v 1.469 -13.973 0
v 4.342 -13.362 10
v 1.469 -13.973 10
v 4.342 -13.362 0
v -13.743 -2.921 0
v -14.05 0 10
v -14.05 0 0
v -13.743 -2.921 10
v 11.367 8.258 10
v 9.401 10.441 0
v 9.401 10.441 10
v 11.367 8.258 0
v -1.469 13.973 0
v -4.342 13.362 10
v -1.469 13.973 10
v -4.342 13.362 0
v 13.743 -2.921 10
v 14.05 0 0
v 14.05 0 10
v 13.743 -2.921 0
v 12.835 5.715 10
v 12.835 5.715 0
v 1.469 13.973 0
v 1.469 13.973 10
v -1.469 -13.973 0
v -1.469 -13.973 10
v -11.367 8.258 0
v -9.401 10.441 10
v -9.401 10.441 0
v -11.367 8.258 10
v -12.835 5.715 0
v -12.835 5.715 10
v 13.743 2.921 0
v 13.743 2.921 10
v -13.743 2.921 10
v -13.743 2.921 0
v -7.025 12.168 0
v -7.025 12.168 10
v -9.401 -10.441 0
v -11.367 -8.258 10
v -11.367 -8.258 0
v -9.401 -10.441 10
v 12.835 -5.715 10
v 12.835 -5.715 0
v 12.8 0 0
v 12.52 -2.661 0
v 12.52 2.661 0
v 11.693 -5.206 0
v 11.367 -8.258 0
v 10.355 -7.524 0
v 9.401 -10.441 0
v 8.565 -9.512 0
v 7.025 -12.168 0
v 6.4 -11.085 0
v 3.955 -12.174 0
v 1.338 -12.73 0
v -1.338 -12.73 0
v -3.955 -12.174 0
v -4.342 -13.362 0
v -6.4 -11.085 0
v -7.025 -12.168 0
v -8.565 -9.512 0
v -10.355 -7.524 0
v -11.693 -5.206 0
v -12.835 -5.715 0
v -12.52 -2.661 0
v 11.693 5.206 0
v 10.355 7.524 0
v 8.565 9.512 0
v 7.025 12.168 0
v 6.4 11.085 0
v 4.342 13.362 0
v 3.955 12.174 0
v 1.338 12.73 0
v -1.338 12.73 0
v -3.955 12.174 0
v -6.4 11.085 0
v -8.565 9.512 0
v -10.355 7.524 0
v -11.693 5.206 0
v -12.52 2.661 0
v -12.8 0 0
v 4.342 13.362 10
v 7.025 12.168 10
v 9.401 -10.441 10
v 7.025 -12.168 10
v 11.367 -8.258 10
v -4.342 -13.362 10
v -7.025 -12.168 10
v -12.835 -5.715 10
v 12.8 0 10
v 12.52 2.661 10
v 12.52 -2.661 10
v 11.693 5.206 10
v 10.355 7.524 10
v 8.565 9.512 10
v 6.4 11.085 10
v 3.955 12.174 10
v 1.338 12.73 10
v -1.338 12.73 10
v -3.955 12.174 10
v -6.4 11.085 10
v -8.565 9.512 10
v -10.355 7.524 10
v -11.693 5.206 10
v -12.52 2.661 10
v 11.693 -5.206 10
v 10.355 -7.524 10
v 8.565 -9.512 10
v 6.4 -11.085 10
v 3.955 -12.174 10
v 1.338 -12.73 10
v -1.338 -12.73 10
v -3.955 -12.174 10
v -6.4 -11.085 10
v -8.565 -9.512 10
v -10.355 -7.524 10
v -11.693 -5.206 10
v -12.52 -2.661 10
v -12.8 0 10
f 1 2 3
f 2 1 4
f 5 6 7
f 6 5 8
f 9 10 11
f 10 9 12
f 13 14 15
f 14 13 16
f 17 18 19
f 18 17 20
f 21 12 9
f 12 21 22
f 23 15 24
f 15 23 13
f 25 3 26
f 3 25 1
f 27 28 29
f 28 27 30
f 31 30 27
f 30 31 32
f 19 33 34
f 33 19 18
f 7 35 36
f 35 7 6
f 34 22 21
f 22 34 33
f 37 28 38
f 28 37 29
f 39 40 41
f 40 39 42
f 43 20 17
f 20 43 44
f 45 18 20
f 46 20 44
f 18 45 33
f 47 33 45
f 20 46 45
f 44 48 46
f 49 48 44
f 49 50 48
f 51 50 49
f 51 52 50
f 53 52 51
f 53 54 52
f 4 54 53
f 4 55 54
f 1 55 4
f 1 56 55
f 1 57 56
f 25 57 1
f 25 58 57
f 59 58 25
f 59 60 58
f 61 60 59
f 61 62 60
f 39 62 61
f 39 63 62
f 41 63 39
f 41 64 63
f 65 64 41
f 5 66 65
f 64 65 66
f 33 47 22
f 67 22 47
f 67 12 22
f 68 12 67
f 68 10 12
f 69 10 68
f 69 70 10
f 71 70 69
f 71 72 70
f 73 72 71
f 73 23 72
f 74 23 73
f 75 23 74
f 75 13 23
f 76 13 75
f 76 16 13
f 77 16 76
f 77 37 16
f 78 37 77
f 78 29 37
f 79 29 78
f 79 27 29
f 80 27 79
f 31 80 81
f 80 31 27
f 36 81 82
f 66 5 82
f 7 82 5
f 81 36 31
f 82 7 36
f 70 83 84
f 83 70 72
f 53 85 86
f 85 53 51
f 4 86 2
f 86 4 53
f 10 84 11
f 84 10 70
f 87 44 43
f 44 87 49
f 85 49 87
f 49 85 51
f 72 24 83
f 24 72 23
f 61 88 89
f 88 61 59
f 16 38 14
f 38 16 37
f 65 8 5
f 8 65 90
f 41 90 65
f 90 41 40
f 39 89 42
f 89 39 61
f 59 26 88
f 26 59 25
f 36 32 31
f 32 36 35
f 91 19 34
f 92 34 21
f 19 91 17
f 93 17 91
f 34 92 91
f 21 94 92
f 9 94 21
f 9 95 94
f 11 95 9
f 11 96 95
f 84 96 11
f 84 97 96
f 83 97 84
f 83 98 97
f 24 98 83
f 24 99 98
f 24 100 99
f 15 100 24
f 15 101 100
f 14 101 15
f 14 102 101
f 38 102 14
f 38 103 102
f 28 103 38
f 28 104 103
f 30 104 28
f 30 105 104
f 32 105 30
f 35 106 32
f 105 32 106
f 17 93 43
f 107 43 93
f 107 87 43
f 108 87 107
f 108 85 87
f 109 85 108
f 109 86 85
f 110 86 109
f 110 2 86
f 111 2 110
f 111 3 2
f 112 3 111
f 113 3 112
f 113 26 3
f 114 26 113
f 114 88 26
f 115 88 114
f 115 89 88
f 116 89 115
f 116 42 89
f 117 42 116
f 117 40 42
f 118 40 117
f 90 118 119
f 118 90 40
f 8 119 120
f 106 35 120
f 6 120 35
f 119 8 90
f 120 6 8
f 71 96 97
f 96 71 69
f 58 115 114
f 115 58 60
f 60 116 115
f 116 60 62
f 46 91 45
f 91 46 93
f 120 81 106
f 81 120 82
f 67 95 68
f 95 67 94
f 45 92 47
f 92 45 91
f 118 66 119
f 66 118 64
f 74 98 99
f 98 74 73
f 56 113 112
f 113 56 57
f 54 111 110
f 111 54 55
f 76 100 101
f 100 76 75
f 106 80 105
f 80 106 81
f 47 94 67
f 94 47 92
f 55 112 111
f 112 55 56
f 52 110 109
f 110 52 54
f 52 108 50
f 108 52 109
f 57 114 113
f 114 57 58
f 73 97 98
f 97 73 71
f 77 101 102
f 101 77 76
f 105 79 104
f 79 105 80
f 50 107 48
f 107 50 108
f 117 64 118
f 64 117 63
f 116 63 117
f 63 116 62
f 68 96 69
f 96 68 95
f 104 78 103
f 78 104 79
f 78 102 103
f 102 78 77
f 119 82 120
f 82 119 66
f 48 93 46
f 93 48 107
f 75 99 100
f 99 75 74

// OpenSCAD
difference() {
    cylinder(h=10,d=25.6+2.5);
    translate([0,0,-.5]) cylinder(h=11,d=25.6);
}
